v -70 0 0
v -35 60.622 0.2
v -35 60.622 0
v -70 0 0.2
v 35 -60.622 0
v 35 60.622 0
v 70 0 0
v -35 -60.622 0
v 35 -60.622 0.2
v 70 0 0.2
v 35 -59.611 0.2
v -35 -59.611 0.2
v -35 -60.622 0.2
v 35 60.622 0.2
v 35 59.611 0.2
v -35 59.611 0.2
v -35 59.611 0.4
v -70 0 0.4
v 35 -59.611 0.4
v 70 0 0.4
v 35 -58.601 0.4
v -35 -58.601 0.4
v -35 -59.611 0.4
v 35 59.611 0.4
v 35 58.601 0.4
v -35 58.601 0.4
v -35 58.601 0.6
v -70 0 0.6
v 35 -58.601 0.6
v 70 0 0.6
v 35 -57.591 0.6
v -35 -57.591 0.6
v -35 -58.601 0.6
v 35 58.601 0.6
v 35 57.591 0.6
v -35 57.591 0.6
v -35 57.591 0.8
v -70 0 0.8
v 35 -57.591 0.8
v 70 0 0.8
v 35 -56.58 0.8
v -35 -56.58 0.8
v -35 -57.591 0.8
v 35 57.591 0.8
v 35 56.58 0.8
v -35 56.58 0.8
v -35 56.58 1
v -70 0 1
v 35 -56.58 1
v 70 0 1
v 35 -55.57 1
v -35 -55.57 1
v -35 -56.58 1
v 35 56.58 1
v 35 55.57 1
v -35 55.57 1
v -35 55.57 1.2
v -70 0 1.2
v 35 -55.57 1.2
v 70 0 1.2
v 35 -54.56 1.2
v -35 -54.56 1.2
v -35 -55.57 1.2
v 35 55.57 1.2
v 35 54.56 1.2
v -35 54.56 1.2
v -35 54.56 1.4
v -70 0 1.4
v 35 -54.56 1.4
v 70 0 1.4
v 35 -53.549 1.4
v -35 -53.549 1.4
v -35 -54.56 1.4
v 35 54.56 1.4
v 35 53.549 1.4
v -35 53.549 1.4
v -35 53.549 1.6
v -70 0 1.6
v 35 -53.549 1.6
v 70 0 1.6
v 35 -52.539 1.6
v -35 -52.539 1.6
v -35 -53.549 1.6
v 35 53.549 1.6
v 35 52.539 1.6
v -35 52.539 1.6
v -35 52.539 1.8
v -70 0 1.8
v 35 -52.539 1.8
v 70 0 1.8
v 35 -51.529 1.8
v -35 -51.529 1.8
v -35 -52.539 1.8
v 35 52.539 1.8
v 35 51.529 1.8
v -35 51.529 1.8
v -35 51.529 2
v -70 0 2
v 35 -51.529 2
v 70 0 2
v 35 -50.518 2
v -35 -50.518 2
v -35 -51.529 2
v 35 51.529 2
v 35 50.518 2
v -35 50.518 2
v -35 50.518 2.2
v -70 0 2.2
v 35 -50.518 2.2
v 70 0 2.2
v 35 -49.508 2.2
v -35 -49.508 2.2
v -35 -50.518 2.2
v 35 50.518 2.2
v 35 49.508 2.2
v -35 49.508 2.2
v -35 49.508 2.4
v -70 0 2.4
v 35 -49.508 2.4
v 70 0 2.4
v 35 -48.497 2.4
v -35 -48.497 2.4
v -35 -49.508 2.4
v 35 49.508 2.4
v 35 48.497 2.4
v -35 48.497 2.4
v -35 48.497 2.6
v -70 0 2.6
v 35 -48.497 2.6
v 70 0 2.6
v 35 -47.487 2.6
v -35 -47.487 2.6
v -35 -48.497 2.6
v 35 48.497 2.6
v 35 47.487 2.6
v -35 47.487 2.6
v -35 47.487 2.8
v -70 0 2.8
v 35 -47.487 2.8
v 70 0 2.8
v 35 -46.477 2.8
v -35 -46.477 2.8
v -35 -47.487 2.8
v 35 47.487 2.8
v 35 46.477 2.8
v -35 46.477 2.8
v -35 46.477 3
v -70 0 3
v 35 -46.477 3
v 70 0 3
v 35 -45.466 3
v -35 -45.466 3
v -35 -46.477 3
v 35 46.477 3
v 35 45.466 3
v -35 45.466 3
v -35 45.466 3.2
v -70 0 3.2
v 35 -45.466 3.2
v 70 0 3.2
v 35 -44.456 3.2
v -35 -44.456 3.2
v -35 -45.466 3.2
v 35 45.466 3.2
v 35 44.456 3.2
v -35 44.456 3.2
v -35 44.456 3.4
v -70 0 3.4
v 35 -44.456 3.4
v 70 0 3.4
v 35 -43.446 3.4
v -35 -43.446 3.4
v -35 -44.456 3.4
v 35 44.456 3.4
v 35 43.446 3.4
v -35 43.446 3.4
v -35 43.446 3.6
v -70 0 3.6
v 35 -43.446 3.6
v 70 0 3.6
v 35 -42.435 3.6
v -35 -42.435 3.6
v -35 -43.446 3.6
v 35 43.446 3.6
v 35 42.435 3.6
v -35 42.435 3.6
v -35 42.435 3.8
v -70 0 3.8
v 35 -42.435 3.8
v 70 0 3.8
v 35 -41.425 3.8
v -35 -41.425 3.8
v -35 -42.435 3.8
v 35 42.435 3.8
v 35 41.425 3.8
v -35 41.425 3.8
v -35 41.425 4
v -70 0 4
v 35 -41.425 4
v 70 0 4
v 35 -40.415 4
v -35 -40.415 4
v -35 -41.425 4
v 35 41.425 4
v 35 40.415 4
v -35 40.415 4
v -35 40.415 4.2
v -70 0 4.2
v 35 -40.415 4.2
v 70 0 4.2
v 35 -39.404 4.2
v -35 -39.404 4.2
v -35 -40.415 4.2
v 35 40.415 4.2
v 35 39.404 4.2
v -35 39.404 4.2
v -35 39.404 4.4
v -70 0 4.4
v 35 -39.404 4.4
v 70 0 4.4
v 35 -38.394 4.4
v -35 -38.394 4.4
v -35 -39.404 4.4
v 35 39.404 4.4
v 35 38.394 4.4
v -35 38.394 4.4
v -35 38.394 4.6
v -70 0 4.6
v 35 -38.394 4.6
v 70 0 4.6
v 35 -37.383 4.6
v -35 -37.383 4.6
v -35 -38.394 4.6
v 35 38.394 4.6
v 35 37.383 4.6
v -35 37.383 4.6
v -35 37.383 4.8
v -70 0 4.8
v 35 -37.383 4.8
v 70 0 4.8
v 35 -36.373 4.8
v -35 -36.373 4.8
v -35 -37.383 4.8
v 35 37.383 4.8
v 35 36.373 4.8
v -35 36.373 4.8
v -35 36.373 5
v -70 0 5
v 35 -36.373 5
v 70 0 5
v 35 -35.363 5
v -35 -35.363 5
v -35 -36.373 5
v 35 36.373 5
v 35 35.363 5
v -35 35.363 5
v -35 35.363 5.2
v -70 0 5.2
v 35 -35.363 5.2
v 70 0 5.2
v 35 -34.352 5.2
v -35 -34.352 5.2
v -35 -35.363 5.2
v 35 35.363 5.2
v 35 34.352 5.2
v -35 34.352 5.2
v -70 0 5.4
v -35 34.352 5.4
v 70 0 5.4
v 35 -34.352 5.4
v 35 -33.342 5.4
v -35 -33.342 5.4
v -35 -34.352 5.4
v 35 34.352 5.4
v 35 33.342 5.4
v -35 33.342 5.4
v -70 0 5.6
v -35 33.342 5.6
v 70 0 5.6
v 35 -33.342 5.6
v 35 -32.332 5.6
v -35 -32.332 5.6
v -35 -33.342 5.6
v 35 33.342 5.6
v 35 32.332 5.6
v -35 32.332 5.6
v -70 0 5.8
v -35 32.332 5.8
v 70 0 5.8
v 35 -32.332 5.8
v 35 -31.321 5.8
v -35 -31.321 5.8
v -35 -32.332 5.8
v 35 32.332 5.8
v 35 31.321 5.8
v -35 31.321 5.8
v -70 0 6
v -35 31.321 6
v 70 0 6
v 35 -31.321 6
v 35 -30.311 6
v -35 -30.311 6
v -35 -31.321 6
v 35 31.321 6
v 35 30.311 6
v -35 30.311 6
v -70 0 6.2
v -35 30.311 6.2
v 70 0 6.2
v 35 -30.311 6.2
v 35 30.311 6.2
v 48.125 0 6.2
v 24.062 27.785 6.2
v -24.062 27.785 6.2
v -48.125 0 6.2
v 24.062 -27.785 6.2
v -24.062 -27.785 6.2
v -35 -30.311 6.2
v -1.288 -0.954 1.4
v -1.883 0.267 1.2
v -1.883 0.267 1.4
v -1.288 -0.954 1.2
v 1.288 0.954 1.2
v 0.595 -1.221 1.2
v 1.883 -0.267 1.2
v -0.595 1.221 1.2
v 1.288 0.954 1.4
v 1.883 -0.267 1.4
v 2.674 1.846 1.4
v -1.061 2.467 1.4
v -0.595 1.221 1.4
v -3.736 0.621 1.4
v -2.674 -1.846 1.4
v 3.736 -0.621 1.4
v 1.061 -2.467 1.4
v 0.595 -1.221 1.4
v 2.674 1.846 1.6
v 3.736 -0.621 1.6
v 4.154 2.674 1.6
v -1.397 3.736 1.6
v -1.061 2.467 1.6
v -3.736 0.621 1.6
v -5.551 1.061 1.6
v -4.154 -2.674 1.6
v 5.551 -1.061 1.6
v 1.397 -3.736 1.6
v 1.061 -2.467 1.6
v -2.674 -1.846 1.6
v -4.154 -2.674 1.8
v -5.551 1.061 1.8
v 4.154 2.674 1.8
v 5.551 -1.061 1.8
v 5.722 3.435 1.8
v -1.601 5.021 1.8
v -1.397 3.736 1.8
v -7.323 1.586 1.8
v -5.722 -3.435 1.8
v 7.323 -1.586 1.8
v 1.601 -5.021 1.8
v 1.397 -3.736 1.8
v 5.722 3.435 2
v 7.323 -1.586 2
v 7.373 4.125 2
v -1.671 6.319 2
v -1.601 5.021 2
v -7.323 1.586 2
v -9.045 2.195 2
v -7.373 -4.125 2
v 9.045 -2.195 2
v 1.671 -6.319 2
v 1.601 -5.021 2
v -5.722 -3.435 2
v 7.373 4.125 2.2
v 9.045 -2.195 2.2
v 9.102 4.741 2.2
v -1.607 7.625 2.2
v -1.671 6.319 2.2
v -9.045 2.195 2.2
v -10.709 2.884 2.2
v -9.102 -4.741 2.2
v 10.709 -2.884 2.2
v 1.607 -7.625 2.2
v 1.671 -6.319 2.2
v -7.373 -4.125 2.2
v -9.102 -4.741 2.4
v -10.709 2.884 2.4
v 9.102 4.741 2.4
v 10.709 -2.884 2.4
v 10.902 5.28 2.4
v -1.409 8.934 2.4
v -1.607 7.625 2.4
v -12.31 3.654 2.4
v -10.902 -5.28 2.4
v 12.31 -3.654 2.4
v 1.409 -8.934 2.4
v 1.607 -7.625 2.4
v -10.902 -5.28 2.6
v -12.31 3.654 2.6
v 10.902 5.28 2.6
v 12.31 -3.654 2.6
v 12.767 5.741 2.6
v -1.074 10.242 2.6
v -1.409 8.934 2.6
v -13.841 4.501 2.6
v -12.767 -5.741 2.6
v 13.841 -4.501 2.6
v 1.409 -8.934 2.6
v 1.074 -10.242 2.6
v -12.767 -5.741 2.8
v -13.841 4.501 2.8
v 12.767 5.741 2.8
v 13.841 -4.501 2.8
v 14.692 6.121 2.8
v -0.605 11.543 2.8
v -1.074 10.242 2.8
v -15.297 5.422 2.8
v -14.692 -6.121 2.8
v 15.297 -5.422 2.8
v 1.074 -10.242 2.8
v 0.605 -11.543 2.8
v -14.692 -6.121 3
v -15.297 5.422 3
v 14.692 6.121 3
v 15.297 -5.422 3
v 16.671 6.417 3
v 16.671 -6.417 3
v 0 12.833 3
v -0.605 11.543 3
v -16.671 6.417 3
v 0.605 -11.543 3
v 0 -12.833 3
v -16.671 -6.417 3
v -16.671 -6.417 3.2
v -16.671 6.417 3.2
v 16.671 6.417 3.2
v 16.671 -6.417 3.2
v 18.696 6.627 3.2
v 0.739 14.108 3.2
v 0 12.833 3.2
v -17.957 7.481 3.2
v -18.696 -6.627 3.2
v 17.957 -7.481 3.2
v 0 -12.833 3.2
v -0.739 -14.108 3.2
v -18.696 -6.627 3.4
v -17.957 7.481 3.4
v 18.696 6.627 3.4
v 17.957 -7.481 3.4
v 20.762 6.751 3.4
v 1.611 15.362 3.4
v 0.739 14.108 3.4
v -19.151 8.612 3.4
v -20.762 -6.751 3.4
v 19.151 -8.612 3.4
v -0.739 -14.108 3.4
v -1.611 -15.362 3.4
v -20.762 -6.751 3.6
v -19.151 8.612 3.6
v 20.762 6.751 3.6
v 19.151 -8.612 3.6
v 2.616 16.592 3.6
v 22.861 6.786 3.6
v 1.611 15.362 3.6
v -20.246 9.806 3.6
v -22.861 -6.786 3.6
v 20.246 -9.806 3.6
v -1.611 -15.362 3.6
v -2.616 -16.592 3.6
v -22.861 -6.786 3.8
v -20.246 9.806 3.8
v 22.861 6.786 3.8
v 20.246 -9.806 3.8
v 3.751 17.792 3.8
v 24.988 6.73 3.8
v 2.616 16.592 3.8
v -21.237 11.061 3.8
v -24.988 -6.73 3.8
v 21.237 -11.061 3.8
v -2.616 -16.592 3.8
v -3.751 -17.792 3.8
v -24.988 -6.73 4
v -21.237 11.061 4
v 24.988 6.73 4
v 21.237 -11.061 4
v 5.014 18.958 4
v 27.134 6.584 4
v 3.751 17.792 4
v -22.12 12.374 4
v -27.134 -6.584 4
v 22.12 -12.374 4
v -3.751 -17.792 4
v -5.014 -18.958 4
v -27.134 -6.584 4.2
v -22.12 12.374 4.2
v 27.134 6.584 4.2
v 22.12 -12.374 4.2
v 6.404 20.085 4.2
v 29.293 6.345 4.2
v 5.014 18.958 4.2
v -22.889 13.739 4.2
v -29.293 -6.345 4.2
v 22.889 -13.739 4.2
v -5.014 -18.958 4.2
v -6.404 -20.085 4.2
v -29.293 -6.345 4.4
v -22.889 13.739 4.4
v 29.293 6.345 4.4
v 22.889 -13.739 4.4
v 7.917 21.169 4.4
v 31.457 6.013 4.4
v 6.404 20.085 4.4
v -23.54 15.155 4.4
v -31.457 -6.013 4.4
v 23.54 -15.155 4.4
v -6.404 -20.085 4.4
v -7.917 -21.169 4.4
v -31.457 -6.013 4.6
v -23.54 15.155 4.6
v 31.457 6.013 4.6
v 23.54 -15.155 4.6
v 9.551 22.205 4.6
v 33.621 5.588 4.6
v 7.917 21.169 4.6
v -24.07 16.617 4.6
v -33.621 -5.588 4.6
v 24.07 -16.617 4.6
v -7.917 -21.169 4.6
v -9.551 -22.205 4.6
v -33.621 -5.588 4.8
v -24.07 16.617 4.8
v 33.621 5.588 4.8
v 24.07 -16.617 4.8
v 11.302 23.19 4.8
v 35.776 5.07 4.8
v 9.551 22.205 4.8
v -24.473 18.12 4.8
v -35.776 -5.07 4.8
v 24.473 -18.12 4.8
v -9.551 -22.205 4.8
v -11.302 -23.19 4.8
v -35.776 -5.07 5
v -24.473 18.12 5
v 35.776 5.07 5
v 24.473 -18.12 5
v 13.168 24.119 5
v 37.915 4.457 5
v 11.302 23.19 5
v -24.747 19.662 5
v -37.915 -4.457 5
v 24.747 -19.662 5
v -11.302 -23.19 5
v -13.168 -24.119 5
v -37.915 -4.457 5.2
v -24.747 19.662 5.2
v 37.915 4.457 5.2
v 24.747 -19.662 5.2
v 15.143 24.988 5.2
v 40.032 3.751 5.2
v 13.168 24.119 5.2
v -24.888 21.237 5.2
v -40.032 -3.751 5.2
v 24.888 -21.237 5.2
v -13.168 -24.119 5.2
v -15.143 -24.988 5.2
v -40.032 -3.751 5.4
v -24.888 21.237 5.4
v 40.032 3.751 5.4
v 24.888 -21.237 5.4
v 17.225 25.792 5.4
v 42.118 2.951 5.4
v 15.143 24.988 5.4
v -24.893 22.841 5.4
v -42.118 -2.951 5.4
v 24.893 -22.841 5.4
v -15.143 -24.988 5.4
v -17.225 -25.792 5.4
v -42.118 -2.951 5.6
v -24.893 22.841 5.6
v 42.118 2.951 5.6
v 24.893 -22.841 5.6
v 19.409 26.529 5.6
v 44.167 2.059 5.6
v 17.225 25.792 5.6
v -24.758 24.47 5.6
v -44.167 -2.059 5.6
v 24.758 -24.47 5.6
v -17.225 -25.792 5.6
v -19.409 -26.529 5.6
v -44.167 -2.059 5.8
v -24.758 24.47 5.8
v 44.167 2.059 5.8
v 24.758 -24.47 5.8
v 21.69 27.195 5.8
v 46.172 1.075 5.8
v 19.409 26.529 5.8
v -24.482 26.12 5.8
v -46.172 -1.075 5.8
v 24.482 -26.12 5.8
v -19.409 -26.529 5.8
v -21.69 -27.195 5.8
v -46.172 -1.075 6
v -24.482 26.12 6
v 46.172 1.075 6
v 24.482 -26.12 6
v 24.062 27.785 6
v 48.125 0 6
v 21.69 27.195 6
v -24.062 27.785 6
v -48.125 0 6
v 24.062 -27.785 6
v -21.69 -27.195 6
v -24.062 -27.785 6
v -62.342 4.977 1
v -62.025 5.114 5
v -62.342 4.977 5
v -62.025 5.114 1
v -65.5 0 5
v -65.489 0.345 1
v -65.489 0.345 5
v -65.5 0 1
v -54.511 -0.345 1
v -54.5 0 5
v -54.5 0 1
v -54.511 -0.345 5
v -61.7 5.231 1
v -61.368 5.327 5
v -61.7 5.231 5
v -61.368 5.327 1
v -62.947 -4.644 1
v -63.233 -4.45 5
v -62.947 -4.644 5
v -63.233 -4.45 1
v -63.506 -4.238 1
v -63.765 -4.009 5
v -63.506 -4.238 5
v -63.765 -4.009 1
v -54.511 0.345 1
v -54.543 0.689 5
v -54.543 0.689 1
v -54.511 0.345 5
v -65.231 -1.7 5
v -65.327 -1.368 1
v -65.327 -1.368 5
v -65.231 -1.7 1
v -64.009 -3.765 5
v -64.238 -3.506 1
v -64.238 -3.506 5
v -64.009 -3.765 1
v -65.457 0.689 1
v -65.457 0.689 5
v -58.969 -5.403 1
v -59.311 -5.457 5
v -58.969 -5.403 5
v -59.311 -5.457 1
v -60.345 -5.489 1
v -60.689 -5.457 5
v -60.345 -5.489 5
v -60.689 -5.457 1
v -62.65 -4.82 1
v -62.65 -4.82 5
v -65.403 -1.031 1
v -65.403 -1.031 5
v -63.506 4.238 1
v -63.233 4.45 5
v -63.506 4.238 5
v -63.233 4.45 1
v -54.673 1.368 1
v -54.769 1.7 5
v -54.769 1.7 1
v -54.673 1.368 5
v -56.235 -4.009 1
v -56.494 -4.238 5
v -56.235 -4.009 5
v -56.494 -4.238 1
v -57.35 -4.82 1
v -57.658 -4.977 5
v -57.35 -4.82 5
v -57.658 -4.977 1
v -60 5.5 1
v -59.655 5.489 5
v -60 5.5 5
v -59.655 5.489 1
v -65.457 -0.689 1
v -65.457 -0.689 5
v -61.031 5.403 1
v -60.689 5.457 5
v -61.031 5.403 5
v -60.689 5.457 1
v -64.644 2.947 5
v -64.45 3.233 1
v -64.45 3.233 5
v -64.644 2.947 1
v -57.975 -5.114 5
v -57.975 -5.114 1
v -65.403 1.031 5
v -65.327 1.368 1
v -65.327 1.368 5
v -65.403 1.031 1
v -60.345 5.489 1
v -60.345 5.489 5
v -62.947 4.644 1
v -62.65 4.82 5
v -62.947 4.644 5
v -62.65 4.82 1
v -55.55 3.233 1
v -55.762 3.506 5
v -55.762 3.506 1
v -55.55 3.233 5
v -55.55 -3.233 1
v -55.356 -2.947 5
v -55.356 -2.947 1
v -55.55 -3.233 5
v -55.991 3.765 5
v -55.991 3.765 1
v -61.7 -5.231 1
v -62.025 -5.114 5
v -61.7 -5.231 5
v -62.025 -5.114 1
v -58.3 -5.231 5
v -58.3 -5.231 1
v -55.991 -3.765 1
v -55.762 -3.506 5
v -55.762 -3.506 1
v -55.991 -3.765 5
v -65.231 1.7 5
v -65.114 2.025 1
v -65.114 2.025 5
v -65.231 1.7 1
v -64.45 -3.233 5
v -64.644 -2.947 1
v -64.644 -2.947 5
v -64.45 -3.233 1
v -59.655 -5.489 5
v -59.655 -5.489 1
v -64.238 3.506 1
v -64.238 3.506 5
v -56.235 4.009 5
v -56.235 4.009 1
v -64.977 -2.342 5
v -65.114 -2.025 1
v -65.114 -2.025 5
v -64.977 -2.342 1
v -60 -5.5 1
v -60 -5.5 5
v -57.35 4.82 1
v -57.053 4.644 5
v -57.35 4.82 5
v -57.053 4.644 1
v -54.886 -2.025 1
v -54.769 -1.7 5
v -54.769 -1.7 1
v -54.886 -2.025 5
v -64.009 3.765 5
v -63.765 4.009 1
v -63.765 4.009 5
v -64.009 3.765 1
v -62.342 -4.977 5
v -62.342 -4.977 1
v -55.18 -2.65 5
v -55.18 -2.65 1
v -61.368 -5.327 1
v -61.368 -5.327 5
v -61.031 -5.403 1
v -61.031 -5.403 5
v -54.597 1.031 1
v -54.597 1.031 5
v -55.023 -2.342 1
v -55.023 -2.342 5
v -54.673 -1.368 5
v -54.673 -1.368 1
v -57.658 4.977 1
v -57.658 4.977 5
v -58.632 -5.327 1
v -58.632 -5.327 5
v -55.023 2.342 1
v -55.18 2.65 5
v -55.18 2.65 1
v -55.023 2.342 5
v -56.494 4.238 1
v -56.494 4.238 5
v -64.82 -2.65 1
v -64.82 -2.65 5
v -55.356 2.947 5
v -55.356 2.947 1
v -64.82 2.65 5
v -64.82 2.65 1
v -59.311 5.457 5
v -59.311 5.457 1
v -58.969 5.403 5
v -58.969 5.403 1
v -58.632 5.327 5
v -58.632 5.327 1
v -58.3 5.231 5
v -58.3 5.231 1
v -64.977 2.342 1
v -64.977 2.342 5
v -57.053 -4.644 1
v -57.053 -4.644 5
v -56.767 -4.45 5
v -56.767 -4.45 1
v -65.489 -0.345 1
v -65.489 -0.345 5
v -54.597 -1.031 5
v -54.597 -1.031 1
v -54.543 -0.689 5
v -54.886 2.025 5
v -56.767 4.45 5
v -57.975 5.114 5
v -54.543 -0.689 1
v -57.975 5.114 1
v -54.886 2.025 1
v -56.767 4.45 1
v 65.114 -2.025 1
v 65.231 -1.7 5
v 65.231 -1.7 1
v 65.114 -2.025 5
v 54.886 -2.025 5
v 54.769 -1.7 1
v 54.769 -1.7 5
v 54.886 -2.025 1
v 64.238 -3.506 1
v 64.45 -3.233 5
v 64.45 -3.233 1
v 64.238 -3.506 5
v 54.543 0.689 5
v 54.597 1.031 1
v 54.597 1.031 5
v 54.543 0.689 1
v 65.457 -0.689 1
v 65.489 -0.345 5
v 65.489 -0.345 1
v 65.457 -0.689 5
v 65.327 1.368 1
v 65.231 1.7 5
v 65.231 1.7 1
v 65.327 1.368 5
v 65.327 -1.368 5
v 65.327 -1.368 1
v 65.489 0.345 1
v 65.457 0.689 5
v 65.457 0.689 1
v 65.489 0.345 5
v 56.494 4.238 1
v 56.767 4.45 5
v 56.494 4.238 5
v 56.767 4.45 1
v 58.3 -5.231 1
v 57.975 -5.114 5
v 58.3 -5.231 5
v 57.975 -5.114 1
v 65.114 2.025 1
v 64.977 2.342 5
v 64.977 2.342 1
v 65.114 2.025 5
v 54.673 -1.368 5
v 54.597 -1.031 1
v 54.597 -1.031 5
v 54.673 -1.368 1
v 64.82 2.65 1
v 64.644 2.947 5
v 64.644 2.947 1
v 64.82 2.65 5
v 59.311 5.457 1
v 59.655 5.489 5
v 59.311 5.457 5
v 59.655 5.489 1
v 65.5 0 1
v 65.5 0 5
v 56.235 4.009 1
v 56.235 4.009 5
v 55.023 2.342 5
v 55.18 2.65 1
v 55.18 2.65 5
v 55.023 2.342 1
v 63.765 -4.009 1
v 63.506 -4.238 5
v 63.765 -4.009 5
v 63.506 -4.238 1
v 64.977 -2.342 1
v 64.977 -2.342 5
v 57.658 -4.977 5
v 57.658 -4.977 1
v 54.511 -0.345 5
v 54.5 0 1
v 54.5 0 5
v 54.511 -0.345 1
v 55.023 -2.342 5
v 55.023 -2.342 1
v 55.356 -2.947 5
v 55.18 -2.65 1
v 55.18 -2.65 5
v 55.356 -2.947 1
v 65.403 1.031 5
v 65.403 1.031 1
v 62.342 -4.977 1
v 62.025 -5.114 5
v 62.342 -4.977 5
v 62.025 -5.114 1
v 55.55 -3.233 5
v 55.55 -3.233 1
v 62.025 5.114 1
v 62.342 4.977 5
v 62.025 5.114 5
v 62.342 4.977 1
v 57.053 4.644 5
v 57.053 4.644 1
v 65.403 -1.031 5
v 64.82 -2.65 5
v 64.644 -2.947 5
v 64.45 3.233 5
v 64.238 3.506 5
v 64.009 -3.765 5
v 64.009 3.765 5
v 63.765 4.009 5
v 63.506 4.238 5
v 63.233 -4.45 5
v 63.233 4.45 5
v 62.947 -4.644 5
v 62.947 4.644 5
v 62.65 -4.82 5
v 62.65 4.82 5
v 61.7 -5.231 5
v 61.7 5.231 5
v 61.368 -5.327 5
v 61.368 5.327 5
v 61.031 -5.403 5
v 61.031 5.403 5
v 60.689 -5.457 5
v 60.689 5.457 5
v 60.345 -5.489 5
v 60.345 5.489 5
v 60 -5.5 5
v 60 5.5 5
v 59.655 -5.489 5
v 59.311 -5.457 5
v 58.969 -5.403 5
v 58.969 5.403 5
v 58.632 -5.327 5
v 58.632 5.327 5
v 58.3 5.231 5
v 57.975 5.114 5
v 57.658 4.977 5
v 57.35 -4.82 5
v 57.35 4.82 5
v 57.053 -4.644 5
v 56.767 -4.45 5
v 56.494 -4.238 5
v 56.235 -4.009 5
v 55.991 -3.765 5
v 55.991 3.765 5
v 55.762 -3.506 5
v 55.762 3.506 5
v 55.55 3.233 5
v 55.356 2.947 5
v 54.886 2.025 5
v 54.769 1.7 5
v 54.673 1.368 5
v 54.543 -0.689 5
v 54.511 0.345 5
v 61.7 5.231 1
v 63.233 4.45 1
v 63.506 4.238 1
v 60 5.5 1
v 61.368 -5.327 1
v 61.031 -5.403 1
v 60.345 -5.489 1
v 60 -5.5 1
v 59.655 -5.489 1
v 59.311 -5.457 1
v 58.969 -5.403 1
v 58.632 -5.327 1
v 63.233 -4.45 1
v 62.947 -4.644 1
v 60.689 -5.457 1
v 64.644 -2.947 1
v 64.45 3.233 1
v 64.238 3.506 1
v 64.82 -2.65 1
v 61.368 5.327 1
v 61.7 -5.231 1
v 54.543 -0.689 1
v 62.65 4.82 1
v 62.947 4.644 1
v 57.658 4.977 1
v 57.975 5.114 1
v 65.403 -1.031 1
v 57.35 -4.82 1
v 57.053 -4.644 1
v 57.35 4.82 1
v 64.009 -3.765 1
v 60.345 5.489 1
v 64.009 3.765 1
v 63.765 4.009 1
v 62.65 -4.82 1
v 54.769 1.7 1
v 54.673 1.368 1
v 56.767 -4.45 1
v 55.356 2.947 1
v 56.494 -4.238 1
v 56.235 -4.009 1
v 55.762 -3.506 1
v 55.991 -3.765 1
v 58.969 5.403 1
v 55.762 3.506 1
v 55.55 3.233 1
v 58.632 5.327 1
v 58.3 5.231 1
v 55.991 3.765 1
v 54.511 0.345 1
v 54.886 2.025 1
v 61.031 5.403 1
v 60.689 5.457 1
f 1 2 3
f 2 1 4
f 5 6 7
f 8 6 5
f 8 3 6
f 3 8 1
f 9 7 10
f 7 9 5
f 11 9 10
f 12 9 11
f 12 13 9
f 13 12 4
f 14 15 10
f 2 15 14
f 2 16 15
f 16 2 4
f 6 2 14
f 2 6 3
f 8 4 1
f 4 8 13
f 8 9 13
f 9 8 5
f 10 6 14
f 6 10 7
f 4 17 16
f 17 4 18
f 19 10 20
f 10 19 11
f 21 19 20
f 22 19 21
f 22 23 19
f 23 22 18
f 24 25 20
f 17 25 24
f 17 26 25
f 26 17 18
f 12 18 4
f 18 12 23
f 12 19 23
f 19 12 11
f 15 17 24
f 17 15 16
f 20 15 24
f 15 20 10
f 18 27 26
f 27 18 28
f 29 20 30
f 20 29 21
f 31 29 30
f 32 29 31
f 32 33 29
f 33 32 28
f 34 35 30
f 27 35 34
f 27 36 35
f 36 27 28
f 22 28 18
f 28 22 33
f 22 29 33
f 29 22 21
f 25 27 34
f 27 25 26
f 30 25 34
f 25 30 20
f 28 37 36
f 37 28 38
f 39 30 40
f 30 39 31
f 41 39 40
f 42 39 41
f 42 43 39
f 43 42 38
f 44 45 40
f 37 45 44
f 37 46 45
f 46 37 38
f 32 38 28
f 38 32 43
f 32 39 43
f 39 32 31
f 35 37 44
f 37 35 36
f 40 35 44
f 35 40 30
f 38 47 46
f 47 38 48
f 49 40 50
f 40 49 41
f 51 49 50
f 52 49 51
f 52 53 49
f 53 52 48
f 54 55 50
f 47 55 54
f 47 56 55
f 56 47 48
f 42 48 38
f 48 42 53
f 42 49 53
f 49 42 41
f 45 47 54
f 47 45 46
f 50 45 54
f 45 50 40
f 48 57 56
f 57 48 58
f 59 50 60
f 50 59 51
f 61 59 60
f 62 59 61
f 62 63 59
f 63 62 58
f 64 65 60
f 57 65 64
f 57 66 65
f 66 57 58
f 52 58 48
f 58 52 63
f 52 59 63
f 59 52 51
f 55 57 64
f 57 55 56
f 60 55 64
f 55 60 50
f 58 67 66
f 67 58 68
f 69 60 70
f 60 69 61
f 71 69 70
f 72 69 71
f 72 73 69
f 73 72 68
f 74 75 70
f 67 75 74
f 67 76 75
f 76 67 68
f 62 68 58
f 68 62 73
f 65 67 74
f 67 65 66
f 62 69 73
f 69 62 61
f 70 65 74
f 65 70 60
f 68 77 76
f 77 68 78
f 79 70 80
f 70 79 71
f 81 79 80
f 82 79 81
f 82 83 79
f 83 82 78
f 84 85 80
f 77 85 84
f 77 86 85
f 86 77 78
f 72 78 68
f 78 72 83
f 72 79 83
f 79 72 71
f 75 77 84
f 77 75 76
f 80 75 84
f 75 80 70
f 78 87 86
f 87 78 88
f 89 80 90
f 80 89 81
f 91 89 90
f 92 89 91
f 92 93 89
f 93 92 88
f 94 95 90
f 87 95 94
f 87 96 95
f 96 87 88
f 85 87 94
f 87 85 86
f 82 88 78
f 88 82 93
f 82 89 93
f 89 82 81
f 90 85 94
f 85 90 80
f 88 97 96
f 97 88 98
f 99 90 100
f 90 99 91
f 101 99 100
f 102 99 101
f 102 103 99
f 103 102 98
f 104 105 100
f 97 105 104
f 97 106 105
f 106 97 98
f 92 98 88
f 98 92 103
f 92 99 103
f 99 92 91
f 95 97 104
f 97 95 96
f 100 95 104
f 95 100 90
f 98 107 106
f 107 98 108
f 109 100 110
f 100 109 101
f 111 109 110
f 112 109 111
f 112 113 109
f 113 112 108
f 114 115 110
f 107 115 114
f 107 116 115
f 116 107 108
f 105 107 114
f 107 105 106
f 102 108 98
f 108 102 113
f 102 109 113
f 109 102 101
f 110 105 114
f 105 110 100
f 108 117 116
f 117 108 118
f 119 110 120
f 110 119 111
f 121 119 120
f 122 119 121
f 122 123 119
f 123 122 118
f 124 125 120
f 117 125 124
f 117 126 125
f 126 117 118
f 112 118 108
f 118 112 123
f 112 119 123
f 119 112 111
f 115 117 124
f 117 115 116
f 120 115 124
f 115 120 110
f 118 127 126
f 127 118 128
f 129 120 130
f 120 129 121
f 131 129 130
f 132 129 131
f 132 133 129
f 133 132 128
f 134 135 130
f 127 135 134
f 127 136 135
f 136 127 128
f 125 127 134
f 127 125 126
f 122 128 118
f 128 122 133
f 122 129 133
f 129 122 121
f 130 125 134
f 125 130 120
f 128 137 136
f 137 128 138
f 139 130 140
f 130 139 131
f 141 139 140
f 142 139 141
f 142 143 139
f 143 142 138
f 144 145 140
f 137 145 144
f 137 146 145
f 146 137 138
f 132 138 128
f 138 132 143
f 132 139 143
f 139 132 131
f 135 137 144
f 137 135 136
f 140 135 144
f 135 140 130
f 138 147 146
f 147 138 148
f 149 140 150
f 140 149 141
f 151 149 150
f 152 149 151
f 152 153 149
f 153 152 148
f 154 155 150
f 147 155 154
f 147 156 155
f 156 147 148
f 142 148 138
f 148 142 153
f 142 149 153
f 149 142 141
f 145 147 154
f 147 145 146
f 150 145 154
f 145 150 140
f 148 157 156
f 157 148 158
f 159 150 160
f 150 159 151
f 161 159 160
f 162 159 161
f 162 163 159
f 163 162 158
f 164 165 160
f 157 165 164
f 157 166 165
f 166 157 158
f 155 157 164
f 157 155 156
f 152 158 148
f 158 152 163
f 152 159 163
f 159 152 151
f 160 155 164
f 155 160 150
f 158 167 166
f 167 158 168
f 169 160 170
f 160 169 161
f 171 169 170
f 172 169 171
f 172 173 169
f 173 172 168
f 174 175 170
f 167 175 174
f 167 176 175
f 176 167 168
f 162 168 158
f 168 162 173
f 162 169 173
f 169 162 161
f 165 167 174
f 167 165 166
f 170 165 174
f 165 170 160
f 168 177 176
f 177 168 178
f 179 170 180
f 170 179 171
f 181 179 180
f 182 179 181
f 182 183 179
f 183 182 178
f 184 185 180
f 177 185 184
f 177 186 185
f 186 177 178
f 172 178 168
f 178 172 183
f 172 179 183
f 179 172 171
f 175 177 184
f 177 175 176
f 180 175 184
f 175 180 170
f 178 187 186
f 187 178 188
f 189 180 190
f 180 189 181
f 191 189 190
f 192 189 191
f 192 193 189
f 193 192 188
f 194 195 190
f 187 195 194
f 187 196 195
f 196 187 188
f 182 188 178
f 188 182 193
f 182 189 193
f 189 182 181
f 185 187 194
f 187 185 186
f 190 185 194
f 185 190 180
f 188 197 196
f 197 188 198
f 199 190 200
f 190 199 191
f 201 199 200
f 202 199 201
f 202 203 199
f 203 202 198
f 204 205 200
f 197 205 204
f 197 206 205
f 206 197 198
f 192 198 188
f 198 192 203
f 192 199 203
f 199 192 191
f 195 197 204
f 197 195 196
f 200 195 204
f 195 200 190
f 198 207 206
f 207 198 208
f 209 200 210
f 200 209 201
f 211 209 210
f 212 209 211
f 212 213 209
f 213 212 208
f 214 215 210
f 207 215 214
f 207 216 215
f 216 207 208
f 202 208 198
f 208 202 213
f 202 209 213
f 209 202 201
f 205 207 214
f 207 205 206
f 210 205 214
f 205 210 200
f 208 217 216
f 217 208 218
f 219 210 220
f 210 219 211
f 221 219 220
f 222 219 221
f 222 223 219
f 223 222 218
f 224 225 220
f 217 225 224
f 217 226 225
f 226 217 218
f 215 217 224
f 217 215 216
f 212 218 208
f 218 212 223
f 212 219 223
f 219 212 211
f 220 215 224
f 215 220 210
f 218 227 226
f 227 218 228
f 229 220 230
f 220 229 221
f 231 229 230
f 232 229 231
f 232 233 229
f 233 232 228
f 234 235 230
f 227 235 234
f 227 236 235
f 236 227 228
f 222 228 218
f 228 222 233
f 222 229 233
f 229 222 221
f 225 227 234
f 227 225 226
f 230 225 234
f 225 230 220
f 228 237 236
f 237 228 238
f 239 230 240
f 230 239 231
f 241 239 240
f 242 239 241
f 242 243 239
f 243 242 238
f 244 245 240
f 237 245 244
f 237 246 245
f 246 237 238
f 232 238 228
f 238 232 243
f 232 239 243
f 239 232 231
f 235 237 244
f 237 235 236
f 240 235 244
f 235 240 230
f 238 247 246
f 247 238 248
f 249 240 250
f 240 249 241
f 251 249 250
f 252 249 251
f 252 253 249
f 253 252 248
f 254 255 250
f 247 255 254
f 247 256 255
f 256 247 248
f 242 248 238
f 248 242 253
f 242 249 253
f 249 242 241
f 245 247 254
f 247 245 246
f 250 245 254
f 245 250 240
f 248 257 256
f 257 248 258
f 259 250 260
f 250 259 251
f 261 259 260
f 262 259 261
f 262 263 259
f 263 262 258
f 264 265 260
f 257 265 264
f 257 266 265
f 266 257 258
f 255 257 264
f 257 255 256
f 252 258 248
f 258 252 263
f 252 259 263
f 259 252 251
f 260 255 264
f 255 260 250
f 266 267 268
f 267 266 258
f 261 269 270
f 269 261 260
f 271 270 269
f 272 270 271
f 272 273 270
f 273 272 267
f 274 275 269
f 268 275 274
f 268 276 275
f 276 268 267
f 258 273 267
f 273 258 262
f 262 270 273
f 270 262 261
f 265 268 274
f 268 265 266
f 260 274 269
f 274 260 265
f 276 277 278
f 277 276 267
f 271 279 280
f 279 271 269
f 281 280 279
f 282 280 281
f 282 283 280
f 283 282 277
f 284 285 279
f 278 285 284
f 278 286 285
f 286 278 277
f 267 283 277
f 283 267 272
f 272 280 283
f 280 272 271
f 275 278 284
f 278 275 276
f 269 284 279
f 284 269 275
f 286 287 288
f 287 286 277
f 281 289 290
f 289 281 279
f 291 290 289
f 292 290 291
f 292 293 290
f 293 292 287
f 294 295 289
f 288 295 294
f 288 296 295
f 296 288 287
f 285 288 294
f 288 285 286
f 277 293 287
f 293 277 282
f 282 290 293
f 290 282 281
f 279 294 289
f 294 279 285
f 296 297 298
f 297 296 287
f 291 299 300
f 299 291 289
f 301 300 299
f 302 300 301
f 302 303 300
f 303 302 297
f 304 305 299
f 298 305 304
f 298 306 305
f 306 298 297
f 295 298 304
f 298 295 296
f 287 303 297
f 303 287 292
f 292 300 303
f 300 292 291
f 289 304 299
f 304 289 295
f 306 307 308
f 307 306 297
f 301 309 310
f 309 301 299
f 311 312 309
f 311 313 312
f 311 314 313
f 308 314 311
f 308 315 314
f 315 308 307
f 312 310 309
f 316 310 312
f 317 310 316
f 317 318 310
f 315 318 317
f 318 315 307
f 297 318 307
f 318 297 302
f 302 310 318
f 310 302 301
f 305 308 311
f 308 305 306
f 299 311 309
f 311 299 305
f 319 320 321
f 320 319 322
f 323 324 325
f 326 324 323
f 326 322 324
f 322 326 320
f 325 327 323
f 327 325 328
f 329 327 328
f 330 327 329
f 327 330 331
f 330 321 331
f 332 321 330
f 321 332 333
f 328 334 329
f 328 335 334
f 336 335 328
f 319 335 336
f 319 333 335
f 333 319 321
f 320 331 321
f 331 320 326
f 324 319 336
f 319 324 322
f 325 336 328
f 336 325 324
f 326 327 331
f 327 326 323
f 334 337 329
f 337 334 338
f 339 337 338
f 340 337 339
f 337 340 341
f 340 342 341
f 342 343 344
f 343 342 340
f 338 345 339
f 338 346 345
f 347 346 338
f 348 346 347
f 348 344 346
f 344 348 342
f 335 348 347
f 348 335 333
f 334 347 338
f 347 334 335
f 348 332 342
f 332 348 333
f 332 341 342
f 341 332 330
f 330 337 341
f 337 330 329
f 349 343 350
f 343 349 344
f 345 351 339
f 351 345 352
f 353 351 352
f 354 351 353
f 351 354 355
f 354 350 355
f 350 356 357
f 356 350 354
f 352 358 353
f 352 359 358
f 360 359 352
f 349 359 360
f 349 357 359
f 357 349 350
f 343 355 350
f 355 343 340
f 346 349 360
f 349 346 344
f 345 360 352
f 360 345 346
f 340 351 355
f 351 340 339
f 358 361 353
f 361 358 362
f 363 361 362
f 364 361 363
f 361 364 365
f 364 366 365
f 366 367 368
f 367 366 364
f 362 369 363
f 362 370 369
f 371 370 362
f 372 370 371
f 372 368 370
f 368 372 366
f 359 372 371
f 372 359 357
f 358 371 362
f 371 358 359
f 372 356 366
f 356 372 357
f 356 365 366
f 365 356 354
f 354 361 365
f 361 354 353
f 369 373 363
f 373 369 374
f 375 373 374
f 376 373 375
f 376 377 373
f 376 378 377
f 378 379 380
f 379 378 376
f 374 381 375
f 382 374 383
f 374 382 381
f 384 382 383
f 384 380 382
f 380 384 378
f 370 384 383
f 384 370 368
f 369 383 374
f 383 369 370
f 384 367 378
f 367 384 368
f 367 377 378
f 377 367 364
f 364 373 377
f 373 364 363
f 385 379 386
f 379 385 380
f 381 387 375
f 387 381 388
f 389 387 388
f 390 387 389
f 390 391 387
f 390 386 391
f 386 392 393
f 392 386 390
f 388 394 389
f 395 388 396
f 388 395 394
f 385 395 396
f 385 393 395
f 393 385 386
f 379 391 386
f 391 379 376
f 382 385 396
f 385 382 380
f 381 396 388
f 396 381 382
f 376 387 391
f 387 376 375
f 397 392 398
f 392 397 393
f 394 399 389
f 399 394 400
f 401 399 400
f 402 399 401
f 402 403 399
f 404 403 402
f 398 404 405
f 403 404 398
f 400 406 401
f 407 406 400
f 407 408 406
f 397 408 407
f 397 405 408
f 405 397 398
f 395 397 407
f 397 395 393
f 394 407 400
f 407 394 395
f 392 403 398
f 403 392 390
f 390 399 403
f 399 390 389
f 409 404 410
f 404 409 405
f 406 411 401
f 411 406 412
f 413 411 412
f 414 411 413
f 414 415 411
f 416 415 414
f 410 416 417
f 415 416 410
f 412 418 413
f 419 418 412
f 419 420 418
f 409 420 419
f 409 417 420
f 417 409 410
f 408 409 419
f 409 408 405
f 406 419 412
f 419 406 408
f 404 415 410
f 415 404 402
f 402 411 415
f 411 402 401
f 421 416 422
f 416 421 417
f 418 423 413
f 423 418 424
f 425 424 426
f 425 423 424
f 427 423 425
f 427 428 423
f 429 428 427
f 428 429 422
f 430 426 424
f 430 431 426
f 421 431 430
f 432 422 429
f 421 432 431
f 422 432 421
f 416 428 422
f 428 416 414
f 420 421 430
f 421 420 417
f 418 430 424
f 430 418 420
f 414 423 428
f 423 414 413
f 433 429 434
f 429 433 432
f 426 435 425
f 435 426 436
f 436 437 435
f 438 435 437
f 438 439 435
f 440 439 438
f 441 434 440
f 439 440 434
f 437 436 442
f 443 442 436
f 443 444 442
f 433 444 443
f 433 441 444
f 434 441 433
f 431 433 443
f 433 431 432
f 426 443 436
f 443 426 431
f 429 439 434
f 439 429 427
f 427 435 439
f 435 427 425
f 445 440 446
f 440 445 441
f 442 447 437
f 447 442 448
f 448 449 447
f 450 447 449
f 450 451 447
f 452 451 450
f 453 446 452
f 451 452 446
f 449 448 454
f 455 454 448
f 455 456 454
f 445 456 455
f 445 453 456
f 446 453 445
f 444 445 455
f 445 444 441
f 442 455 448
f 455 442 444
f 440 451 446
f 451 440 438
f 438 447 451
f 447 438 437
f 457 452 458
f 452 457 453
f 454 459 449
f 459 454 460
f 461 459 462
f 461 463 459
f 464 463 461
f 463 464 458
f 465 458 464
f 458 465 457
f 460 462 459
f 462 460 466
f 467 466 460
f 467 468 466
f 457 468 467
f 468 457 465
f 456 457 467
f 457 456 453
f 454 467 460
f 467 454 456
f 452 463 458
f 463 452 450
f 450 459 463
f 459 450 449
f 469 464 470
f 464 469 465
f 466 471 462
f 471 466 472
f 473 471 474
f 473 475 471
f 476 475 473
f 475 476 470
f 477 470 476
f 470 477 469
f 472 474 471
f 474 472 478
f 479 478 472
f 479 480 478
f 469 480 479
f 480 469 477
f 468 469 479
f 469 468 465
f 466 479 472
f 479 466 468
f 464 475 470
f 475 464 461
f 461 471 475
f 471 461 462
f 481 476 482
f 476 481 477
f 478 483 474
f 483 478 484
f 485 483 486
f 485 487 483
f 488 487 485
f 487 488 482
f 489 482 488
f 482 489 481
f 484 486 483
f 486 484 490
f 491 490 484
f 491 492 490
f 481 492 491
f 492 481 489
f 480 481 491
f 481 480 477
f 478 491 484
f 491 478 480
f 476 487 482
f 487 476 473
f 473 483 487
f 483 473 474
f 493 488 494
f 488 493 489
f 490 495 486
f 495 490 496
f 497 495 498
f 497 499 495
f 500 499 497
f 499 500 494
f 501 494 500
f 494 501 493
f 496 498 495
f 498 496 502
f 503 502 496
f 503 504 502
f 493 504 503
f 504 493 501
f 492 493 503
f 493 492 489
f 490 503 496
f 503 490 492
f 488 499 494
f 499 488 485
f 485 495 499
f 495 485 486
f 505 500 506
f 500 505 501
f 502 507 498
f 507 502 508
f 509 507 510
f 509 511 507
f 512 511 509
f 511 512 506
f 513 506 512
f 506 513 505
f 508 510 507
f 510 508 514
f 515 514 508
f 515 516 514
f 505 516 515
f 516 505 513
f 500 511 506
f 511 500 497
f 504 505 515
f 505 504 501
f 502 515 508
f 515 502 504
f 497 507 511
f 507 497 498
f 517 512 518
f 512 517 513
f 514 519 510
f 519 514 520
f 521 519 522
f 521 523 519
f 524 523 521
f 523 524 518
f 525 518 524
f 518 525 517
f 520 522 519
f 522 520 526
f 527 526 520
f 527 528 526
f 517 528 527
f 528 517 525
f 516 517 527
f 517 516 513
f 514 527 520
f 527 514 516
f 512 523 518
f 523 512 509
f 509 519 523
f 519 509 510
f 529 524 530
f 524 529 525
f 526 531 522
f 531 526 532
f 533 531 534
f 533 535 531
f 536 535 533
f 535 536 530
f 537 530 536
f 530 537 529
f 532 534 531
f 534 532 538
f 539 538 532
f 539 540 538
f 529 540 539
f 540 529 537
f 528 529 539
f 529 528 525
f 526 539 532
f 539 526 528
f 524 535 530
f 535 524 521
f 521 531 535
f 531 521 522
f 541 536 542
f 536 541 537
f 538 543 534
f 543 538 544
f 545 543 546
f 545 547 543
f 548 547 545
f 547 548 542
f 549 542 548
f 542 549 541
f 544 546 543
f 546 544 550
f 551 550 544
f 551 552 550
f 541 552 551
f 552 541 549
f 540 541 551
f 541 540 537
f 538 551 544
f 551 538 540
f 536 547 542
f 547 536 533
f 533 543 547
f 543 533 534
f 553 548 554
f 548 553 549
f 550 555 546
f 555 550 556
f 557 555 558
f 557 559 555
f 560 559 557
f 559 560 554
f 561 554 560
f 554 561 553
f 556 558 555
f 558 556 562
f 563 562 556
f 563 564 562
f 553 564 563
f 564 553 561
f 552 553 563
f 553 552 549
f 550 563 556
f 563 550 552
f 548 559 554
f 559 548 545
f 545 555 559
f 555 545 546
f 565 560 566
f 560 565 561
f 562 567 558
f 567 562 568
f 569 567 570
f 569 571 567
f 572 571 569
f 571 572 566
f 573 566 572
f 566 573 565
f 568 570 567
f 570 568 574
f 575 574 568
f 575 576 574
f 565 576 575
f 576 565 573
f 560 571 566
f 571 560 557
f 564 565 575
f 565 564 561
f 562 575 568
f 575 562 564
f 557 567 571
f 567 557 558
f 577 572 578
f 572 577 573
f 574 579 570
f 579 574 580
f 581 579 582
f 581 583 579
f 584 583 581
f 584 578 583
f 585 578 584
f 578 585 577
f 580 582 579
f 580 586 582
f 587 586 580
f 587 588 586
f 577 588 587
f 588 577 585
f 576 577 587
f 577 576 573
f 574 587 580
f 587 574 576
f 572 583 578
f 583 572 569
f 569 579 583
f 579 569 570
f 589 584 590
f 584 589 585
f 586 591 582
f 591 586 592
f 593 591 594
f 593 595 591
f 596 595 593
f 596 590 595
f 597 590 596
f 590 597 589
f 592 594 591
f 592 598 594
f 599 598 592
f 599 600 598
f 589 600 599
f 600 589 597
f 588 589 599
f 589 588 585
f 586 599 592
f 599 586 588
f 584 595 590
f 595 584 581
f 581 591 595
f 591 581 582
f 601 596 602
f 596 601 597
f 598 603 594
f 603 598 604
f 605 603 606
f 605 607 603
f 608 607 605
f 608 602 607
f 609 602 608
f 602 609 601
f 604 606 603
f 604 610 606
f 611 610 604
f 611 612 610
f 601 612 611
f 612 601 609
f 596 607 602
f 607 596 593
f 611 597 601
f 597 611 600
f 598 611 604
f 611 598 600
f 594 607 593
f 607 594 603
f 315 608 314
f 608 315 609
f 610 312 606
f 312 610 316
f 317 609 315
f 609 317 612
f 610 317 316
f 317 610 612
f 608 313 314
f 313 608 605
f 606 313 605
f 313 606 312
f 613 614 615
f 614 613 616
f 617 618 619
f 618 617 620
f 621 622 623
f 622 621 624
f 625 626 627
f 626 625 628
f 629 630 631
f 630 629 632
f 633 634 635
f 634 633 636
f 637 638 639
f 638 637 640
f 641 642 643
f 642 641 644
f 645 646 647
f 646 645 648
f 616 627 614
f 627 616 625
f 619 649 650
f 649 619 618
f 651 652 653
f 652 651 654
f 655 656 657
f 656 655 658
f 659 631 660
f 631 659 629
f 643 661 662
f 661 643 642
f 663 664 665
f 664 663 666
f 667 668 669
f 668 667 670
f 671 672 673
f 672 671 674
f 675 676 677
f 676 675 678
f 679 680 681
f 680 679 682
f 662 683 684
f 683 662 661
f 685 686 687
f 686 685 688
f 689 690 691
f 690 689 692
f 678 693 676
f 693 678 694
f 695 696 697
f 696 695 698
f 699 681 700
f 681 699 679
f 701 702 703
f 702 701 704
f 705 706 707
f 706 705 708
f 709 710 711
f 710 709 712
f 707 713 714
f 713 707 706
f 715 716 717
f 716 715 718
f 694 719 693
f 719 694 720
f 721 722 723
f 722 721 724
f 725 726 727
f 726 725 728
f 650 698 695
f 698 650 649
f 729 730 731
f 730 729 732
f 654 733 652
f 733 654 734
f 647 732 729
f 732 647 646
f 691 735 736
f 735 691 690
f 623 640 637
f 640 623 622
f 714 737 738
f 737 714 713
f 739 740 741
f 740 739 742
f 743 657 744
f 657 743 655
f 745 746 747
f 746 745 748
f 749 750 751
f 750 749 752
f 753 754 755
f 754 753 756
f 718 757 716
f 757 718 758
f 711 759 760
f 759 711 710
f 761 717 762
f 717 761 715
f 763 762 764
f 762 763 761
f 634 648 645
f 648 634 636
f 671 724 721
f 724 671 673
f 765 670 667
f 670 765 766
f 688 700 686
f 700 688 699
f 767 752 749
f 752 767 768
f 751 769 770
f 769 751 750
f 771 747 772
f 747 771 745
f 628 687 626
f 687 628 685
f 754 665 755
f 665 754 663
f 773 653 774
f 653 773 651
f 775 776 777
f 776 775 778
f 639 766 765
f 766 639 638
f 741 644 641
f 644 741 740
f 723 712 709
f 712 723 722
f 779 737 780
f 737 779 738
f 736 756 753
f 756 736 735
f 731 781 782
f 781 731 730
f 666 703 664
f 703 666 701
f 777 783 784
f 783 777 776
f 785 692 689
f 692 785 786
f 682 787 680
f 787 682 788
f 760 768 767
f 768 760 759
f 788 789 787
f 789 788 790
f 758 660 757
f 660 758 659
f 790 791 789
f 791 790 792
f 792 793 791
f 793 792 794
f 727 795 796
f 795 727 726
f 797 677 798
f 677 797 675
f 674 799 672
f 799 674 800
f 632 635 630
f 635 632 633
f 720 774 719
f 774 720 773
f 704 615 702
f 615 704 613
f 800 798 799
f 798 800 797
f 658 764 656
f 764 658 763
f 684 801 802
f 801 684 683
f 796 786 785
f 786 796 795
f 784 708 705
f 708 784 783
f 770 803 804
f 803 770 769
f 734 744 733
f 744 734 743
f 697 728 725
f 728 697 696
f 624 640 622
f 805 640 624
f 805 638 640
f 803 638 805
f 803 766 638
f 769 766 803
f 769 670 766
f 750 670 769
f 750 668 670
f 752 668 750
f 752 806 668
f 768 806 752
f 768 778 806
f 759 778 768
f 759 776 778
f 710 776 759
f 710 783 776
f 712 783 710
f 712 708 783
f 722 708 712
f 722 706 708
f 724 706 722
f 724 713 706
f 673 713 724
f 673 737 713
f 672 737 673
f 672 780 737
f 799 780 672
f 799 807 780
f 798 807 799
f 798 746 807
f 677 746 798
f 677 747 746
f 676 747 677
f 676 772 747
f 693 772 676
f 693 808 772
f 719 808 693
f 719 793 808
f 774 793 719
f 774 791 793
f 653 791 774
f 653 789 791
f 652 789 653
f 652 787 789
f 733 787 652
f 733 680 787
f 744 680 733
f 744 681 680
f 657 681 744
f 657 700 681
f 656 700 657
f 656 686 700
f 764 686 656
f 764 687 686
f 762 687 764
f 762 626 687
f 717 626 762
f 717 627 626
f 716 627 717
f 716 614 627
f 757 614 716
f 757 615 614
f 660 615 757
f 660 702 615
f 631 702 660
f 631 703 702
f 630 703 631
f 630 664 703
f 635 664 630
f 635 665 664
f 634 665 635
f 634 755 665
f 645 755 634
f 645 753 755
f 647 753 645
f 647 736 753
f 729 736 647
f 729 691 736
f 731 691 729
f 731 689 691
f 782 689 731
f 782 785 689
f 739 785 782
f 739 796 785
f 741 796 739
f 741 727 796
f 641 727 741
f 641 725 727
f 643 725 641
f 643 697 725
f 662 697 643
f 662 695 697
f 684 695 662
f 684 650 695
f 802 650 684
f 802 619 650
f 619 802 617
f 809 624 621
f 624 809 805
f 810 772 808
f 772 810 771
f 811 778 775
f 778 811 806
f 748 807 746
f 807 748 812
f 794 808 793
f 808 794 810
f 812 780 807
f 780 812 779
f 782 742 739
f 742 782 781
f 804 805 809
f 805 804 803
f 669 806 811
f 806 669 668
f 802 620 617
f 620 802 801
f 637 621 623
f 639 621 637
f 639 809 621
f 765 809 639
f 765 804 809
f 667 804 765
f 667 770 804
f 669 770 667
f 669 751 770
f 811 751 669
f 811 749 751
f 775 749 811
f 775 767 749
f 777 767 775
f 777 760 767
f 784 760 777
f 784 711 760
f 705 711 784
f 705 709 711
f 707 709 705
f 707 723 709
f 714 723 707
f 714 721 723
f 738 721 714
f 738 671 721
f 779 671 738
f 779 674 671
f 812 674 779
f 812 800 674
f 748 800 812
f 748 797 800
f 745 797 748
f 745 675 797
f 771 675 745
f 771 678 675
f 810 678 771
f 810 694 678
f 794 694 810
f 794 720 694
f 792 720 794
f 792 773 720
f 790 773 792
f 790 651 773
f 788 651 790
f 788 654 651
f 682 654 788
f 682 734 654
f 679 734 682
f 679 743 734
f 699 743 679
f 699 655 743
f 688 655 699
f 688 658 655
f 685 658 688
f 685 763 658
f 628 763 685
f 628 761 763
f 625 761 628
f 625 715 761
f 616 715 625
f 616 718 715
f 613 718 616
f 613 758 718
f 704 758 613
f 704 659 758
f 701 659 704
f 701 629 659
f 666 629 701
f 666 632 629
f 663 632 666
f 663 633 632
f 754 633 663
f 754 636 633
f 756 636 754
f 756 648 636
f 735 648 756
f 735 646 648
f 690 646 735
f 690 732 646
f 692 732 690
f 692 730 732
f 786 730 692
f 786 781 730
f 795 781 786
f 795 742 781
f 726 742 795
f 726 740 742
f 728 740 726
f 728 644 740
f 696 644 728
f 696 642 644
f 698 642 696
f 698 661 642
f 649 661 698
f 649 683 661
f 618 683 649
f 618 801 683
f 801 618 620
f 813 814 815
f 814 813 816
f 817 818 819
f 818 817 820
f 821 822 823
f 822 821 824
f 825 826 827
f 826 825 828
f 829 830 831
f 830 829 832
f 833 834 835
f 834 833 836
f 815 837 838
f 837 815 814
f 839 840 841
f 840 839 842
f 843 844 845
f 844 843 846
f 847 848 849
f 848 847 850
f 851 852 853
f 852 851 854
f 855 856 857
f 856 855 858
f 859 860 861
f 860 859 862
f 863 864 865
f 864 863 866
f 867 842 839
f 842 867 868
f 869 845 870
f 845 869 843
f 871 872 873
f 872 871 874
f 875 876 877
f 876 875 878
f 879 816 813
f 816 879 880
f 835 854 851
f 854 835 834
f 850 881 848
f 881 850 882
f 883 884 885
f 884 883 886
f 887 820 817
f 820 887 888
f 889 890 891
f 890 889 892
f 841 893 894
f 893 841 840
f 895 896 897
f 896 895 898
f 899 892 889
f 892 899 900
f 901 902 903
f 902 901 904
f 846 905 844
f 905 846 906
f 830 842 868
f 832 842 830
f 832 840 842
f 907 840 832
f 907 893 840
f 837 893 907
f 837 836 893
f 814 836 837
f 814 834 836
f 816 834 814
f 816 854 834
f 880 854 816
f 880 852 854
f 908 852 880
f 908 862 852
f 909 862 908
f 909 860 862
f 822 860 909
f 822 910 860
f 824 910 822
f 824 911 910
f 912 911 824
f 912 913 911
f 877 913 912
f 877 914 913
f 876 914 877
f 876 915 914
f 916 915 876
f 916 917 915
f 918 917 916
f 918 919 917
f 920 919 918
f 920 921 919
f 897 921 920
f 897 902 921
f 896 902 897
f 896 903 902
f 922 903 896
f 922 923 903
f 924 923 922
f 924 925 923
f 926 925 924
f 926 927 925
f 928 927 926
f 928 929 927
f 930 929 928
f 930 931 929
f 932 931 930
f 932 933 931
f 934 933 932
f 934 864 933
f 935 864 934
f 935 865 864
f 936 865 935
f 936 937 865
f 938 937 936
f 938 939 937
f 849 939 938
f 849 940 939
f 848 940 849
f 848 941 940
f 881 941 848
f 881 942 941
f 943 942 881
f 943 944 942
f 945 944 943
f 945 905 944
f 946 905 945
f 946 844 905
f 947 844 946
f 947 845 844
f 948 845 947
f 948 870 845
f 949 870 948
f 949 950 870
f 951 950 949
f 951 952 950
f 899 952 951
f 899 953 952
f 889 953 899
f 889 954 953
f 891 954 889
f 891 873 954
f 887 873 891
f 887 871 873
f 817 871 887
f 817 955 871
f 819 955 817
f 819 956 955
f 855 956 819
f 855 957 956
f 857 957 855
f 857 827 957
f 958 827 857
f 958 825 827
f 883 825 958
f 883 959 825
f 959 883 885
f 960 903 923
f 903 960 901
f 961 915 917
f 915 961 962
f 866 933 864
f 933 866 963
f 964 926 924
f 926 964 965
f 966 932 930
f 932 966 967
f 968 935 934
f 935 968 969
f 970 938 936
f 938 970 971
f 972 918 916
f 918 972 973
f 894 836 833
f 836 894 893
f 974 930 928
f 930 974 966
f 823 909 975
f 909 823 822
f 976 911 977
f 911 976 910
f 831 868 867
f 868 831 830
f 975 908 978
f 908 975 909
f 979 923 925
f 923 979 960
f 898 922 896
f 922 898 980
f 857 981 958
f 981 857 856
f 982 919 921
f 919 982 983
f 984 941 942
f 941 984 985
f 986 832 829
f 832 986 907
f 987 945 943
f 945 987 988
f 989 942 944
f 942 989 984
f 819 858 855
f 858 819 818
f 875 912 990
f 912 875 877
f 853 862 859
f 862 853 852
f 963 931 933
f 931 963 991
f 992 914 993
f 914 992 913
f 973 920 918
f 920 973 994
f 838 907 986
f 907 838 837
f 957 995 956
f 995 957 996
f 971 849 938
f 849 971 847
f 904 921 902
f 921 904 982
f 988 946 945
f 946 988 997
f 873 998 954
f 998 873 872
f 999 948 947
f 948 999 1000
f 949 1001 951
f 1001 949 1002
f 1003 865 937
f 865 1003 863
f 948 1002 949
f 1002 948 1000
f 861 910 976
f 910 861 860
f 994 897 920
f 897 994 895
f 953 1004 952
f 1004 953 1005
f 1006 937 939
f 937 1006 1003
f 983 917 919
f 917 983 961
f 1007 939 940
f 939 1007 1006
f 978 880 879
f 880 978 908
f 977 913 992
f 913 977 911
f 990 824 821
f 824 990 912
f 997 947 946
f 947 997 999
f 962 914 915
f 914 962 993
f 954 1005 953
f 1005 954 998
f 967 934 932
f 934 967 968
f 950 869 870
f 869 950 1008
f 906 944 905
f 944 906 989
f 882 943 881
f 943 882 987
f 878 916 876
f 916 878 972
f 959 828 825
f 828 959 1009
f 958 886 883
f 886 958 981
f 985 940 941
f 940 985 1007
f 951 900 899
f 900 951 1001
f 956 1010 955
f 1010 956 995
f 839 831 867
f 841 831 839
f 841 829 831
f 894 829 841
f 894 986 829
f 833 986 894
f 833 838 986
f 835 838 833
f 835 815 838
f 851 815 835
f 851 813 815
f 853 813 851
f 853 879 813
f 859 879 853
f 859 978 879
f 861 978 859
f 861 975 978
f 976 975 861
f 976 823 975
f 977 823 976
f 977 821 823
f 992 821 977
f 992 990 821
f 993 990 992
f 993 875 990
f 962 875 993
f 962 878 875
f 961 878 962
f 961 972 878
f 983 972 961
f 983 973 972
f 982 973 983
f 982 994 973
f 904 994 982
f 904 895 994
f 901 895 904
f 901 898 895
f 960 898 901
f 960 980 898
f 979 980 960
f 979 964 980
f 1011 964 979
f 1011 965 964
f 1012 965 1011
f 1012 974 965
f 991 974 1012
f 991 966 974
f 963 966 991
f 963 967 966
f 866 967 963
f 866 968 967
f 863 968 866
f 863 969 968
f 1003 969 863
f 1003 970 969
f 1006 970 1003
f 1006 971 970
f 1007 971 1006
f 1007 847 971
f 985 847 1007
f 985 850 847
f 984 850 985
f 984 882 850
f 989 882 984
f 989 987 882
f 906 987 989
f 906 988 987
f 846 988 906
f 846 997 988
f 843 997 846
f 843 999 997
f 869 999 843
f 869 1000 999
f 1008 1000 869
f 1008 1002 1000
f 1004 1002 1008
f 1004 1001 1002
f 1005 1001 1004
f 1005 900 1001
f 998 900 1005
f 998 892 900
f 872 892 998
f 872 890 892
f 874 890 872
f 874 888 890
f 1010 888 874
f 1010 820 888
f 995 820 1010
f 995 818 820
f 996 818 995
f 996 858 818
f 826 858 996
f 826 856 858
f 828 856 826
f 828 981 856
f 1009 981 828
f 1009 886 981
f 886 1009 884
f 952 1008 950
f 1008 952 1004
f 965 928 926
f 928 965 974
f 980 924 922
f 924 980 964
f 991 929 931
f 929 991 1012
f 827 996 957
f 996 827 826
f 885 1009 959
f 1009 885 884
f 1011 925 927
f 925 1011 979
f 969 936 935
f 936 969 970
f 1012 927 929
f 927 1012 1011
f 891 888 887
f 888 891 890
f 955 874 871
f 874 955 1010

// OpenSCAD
// file: ../../gospel.scad
/**
 * GOSPEL: George's OpenSCAD Procedural Enhancement Library
 * @author glaza
 *
 * Index:
 *      Translation: x, y, z, xy, xz, yz, xyz (displacement, variation)
 *      Scaling:     sx, sy, sz, sxy, sxz, syz, s (factor, variation)
 *      Rotation:    rx, ry, rz (angle, variation)
 *      Duplication: dx, dy, dz ()
 */

/**
 * Translates the children in the X,Y,Z direction
 * @param d Displacement in X,Y,Z direction
 * @param variation The random variation + or - added to the displacement * 
 *  x      Translate X
 *  y      Translate Y
 *  z      Translate Z
 *  xy     Translate equaly in X and Y
 *  xz     Translate equaly in X and Z
 *  yz     Translate equaly in Y and Z
 *  xyz    Translate equaly in X, Y and Z
 */
module x(dx, variation=0) 
{   
    vx = rands(-variation,variation,1)[0];
    translate([dx+vx,0,0])
    children();
}
module y(dy, variation=0) 
{   
    vy = rands(-variation,variation,1)[0];
    translate([0,dy+vy,0])
    children();
} 
module z(dz, variation=0) 
{   
    vz = rands(-variation,variation,1)[0];
    translate([0,0,dz+vz])
    children();
}
module xy(d, variation=0) 
{   
    x(d, variation)
    y(d, variation)
    children();
}
module yz(d, variation=0) 
{   
    z(d, variation)
    y(d, variation)
    children();
}
module xz(d, variation=0) 
{   
    x(d, variation)
    z(d, variation)
    children();
}
module xyz(d, variation=0) 
{   
    xy(d, variation)
    z(d, variation)
    children();
}

/**
 * Rotates the children around the X axis
 * @param angle Degrees to rotate around the X axis
 * @param variation The random variation + or - added
 *  rx     Rotate around X
 *  ry     Rotate around Y
 *  rz     Rotate around Z
 */
module rx(angle, variation=0) 
{   
    v = rands(-variation,variation,1)[0];
    rotate([angle+v,0,0])
    children();
}
module ry(angle, variation=0) 
{   
    v = rands(-variation,variation,1)[0];
    rotate([0,angle+v,0,0])
    children();
}
module rz(angle, variation=0) 
{   
    v = rands(-variation,variation,1)[0];
    rotate([0,0,angle+v])
    children();
}

/**
 * Duplicates the children across the different planes.
 *      dx: YZ plane, dy: XZ plane, dz: XY plane
 */
module dx() 
{
    mirror([1,0,0])
    children();

    children();
}
module dy() 
{
    mirror([0,1,0])
    children();

    children();
}
module dz() 
{
    mirror([0,0,1])
    children();

    children();
}

/**
 * Mirrors across diferent planes.
 *      mx: YZ plane, my: XZ plane, mz: XY plane
 */
module mx() 
{
    mirror([1,0,0])
    children();
}
module my() 
{
    mirror([0,1,0])
    children();
}
module mz() 
{
    mirror([0,0,1])
    children();
}

/**
 * Scales in different directions
 *      mx: YZ plane, my: XZ plane, mz: XY plane
 */
module sx(factor, variation=0) 
{   
    v = rands(-variation,variation,1)[0];
    scale([factor+v,1,1])
    children();
}
module sy(factor, variation=0) 
{   
    v = rands(-variation,variation,1)[0];
    scale([1,factor+v,1])
    children();
} 
module sz(factor, variation=0) 
{   
    v = rands(-variation,variation,1)[0];
    scale([1,1,factor+v])
    children();
}
module sxy(factor, variation=0) 
{   
    sx(factor, variation)
    sy(factor, variation)
    children();
}
module syz(factor, variation=0) 
{   
    sz(factor, variation)
    sy(factor, variation)
    children();
}
module sxz(d, variation=0) 
{   
    sx(factor, variation)
    sz(factor, variation)
    children();
}
module s(factor, variation=0) 
{   
    sxy(factor, variation)
    sz(factor, variation)
    children();
}

/**
 * Shortcuts
 */
module diff() //does not work
{
    difference()
    {
        children();
    }
}


/**
 * Colours
 */
module red()
{
    color("Red")
    children();
}
module blue()
{
    color("RoyalBlue")
    children();
}
module black()
{
    color("Black")
    children();
}
module white()
{
    color("White")
    children();
}
// main file
include <../../gospel.scad>

$fn = 50;

tolerance = 3;
wall_thickness = 3;
magnet_depth = 4;
magnet_diameter = 11;
magnet_offset = 1;
block_depth = magnet_depth + 2 * magnet_offset;

difference()
{
    union()
    {
        //cylinder( h = block_depth,
        //          $fn=6,
        //          d = 140 );
        
        delta_step = 0.2; // final render
        //delta_step = 1; // debug
        for ( step = [0:delta_step:block_depth/*-delta_step*/] )
        {            
            z(step)
            //rz( 30*(cos((step/block_depth+1)*180) + 1) )
            //rz( -10*(cos((2*step/block_depth+1)*180) + 1) )
            sy( 1 - 0.5 * step / block_depth )
            rz( 0 * step )
            linear_extrude( height = delta_step,
                            convexity = 2,
                            //twist = 60/block_depth,
                            $fn = 100 ) 
            {
                circle(
                    $fn=6,
                    d = 140 );
            }
        }
        
        dx() 
        x(60)
        cylinder( h = block_depth,
                  d = magnet_diameter + 2 * magnet_offset );
    }   
        
    
    z( magnet_offset )
    union()
    {        
        inner_step = 0.2; // final render
        for ( in_step = [0:inner_step:block_depth-magnet_offset] )
        {            
            z(in_step)
            //rz( 30*(cos((step/block_depth+1)*180) + 1) )
            //rz( -10*(cos((2*step/block_depth+1)*180) + 1) )
            sx( 1.5 )
            sxy( 0.55 * in_step / block_depth )
            rz( 10 * ( block_depth - magnet_offset - in_step ) )
            linear_extrude( height = inner_step,
                            convexity = 2,
                            //twist = 60/block_depth,
                            $fn = 100 ) 
            {
                circle(
                    $fn=6,
                    d = 140 );
            }
        }
    }
    
    // Magnet holes
    z( block_depth / 2 )
    dx()
    x( 60 )
    z( block_depth / 2 - magnet_depth - magnet_offset )
    cylinder( $fn = 100,
              d = magnet_diameter,
              h = magnet_depth );
    
}
